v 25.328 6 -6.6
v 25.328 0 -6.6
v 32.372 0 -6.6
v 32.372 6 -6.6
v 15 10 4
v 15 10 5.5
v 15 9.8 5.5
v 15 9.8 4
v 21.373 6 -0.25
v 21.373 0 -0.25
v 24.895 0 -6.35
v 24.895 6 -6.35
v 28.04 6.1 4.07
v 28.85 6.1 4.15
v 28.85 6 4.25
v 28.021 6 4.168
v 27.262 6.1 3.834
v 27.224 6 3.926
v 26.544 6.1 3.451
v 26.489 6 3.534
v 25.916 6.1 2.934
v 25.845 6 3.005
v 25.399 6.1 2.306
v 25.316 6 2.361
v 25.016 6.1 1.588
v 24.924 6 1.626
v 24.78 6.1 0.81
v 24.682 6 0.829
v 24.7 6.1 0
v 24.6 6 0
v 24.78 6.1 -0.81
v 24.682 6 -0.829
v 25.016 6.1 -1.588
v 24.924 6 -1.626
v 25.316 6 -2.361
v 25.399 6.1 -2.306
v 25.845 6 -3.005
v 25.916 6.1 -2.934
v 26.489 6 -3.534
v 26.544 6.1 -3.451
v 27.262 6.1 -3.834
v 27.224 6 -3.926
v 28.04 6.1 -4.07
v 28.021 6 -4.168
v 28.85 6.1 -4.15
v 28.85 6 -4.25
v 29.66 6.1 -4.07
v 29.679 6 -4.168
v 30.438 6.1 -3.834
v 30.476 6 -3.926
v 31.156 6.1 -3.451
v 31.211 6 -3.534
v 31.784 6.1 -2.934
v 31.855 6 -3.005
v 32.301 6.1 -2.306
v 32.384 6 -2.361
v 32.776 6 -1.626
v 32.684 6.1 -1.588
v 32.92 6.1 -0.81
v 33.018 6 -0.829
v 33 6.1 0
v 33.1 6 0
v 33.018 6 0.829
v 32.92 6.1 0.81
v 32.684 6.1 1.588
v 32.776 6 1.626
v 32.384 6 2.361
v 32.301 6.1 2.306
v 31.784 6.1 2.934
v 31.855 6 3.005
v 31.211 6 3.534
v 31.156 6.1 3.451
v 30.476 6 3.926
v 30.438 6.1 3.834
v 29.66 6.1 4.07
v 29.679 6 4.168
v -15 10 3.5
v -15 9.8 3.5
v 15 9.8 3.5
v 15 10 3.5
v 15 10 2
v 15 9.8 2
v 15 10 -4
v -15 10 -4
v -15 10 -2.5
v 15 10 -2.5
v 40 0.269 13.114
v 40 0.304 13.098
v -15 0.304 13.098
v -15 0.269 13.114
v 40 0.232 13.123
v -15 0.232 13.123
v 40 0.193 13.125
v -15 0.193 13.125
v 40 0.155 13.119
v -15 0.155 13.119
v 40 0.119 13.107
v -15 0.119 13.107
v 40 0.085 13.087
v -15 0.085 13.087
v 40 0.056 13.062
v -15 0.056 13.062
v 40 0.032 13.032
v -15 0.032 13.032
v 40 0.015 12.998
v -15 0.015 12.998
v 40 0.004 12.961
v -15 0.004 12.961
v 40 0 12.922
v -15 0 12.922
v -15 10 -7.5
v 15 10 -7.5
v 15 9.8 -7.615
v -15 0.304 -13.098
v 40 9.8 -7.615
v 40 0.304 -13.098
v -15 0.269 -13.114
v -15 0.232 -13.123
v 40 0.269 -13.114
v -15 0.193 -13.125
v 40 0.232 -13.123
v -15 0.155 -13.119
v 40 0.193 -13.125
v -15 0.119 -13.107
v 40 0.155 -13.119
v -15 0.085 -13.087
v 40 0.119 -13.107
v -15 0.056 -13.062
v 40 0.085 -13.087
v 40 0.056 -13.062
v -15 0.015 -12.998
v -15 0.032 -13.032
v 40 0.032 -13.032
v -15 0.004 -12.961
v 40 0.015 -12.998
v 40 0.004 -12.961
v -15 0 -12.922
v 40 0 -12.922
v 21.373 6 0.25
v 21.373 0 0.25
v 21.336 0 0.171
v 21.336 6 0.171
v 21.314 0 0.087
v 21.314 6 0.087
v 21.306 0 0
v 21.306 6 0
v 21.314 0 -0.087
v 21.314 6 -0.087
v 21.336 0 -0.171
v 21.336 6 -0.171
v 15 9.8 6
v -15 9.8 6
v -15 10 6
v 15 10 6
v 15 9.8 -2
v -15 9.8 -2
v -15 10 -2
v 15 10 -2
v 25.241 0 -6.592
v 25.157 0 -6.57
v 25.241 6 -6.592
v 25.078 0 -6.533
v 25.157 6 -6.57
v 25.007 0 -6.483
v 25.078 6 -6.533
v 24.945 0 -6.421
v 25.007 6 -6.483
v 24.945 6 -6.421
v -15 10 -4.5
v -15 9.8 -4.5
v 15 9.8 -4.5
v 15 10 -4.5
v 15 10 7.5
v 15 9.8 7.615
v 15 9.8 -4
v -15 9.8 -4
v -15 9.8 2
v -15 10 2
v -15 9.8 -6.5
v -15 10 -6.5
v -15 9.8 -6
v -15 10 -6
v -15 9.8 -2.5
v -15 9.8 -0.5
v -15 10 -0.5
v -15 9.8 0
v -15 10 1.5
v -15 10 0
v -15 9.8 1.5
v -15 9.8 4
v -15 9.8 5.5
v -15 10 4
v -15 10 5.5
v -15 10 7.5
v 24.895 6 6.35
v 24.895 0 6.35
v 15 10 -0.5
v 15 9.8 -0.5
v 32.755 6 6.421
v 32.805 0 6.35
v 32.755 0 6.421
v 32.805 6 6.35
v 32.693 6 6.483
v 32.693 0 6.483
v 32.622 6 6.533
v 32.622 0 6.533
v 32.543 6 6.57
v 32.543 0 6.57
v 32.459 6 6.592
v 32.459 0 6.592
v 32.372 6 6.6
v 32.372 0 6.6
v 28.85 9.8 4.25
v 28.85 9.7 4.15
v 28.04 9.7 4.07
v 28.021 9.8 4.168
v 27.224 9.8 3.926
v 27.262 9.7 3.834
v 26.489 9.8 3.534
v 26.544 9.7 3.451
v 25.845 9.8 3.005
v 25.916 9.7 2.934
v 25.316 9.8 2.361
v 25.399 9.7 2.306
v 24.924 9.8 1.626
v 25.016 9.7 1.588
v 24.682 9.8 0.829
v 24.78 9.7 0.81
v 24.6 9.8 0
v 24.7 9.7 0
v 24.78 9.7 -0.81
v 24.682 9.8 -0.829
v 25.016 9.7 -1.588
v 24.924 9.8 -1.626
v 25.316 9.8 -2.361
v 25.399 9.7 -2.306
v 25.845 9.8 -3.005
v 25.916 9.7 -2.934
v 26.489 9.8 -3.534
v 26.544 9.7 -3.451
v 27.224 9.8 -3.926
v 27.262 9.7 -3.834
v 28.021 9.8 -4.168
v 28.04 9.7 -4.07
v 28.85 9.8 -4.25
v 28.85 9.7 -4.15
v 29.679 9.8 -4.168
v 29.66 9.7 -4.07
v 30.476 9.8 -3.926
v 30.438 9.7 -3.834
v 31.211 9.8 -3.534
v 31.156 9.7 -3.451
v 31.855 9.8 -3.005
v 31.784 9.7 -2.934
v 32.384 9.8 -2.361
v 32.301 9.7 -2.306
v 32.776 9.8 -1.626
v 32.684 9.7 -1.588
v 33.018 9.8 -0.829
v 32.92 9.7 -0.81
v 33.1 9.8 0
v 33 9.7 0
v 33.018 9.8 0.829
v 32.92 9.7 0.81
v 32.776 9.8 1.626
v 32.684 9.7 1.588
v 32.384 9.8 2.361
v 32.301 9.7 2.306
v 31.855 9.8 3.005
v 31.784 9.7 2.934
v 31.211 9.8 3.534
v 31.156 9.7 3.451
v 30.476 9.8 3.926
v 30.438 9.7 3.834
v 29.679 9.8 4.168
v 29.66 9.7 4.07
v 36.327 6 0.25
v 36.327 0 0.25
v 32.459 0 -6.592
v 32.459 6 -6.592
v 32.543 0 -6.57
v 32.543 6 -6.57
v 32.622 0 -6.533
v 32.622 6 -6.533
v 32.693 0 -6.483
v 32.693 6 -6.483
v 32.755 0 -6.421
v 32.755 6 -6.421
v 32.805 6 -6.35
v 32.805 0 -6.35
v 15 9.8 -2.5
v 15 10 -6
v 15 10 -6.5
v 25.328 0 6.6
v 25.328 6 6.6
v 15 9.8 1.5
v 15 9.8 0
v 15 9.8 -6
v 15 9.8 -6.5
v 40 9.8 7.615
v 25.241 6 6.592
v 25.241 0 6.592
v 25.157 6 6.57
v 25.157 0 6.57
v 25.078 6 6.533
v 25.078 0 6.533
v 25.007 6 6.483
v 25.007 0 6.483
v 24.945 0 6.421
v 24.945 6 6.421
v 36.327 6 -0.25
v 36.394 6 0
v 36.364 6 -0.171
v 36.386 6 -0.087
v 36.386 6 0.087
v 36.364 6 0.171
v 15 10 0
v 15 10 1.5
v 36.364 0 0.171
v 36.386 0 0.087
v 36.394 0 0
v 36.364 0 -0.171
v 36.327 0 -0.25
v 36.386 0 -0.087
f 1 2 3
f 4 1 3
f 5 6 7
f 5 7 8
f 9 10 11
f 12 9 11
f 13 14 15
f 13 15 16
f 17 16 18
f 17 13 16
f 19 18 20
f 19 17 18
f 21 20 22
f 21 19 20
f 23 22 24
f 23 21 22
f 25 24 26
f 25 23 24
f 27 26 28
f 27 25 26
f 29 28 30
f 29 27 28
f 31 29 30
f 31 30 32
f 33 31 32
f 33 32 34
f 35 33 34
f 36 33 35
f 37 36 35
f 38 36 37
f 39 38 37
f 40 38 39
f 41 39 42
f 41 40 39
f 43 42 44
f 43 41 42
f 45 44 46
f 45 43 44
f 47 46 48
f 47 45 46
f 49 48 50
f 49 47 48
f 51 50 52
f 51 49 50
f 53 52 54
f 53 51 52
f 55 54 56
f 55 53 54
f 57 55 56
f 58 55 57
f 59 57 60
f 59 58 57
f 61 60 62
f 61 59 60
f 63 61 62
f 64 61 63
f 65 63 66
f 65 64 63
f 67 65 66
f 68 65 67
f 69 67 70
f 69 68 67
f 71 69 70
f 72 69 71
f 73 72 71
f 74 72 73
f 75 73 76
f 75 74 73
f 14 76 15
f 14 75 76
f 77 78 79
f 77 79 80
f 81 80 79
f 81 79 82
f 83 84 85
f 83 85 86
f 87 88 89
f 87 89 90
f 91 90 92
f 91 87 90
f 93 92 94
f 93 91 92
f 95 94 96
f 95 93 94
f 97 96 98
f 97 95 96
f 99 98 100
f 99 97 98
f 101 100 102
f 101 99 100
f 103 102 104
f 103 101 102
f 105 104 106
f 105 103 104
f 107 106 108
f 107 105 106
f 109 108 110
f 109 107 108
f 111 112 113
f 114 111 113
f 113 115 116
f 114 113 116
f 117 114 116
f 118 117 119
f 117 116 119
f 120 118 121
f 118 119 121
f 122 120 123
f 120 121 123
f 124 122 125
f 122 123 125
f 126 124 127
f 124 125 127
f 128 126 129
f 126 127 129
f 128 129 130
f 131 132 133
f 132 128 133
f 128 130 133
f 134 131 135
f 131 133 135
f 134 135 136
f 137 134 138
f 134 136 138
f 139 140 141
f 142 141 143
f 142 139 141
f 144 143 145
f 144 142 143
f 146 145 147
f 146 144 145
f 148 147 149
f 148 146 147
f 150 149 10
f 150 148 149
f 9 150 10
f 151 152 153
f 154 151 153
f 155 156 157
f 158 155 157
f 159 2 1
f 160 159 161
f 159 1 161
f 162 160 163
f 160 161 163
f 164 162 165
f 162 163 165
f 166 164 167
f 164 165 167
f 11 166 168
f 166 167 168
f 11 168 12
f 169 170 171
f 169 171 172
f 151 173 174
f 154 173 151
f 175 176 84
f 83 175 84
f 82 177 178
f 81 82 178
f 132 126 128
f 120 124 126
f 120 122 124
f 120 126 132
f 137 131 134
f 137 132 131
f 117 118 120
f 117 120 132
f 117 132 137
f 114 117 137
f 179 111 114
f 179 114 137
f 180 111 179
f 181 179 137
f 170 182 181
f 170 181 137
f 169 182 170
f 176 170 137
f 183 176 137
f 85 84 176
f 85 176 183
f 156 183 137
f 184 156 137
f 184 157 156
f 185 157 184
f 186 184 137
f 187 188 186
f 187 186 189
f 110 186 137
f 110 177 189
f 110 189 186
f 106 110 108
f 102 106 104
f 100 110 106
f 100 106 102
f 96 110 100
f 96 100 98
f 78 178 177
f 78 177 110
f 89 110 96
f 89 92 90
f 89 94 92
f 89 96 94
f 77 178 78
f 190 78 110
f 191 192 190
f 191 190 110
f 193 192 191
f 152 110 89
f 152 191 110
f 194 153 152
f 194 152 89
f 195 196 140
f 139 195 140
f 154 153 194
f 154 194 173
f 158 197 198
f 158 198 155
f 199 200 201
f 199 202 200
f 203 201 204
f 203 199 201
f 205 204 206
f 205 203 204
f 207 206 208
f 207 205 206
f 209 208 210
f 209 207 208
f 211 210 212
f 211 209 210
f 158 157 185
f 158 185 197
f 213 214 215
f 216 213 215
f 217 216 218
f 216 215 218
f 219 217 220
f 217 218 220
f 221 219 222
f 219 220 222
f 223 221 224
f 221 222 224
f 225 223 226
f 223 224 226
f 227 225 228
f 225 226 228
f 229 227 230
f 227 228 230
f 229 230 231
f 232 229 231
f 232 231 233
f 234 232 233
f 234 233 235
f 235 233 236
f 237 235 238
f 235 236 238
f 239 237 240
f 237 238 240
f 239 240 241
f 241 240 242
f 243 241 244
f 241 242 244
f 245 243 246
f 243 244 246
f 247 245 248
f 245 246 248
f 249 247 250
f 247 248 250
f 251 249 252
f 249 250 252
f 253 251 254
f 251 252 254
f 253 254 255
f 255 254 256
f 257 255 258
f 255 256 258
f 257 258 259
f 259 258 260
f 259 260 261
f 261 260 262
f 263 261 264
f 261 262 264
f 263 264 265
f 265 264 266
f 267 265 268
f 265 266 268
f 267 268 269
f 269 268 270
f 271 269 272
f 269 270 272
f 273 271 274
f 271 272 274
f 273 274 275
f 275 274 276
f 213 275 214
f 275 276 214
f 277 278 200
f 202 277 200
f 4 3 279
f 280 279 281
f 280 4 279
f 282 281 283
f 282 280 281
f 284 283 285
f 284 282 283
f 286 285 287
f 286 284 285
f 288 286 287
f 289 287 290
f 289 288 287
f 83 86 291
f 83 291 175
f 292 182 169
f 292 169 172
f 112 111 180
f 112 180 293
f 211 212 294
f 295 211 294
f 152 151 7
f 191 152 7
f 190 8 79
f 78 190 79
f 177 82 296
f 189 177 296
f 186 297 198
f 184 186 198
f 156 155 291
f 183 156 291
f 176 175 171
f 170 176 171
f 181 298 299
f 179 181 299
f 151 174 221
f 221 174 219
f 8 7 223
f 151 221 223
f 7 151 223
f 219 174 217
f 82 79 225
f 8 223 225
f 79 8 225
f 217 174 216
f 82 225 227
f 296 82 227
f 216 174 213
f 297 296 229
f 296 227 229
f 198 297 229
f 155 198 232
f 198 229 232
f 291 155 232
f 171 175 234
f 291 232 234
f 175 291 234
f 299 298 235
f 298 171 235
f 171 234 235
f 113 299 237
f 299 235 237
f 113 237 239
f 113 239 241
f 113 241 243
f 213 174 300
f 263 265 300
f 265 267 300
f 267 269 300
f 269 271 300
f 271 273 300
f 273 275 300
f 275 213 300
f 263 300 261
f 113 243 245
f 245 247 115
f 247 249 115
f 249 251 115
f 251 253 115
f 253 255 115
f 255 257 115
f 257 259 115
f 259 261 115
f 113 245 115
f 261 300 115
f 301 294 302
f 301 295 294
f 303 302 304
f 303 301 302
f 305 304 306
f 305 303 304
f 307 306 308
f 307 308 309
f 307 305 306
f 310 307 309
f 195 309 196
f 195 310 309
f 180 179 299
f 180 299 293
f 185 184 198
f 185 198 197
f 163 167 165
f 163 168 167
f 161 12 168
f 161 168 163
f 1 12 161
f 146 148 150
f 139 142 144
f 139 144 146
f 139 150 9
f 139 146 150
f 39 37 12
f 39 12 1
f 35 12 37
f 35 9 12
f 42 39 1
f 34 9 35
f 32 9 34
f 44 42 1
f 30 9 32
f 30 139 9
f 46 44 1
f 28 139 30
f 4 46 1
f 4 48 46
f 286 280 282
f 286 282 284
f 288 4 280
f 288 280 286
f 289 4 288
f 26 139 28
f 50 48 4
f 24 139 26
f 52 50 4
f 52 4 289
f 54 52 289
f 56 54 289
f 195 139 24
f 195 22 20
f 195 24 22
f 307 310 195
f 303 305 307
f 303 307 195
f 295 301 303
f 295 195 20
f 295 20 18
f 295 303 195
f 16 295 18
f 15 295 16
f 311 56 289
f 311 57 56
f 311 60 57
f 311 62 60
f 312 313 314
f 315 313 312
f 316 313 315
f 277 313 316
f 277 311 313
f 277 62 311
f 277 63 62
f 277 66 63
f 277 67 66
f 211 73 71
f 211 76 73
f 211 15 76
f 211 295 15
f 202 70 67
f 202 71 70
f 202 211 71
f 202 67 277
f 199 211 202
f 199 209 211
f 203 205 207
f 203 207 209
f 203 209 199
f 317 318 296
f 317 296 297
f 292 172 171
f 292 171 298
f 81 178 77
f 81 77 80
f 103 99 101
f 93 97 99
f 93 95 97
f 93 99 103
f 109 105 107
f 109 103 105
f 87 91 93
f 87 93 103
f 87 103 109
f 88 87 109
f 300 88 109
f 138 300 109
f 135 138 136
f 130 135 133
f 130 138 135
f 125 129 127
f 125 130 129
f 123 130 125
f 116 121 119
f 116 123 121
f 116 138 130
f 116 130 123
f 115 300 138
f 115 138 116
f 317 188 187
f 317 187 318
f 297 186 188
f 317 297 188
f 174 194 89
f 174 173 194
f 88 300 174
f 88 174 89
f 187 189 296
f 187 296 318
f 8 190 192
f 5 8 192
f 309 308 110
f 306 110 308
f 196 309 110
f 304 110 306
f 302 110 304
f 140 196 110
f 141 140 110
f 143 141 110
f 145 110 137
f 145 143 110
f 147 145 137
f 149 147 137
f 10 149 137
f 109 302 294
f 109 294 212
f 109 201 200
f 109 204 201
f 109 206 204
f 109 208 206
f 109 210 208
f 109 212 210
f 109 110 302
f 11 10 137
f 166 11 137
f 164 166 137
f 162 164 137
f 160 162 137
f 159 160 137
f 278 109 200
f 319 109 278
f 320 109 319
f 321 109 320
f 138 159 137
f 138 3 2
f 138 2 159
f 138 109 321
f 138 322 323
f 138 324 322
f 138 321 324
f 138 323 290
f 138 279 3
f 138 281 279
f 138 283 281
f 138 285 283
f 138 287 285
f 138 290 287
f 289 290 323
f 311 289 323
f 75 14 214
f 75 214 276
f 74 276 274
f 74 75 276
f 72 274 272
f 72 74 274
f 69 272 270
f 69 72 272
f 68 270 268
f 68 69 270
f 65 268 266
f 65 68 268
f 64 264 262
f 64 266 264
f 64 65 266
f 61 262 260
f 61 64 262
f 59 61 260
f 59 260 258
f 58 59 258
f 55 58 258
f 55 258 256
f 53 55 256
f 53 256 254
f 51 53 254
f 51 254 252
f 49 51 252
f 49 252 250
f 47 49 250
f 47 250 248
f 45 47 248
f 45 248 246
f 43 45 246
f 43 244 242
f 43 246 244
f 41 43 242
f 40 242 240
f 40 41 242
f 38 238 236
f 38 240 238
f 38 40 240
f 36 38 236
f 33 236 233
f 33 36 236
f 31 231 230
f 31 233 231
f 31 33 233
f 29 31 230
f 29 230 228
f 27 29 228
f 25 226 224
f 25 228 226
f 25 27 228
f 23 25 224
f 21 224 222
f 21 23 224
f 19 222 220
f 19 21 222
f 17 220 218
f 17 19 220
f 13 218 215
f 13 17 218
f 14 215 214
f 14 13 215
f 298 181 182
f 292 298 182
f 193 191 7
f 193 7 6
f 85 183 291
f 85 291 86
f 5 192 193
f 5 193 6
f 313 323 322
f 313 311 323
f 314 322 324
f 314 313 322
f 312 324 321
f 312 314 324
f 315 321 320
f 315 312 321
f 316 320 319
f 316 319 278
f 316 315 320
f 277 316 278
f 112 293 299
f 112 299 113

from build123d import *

# Parameters (mm, degrees)
SKETCH1_R                       = 4.15
BOSS_EXTRUDE1_DEPTH             = 10
CUT_EXTRUDE2_DEPTH              = 42.907636536
CUT_EXTRUDE2_DEPTH_BACK         = 42.907636536
SKETCH2_W                       = 0.5
SKETCH2_H                       = 0.2
BOSS_EXTRUDE2_REACH             = 43.908
BOSS_EXTRUDE2_DIRECTION_2_REACH = 43.908
SKETCH10_W                      = 15.230940108
SKETCH10_H                      = 0.2
CUT_EXTRUDE6_DEPTH              = 25
CUT_EXTRUDE5_DEPTH              = 6
FILLET3_R                       = 0.5
CHAMFER1_SIZE                   = 0.1


with BuildPart() as part:
    # Sketch1 → Boss-Extrude1 (new body)
    with BuildSketch(Plane(origin=(0, 0, 0), x_dir=(1, 0, 0), z_dir=(0, 1, 0))):
        Polygon((-15, -7.5), (15, -7.5), (40, -7.5), (40, 7.5), (15, 7.5), (-15, 7.5), align=None)
        with Locations(Location((28.85, 0, 0), (0, 0, 270))):
            Circle(SKETCH1_R, mode=Mode.SUBTRACT)
    extrude(amount=BOSS_EXTRUDE1_DEPTH)

    # Sketch2 → Cut-Extrude2 (cut, two sides: drawn at the far end of the back side and taken through both)
    with BuildSketch(Plane(origin=(0, 0, 0), x_dir=(0, 0, -1), z_dir=(1, 0, 0)).offset(-CUT_EXTRUDE2_DEPTH_BACK)):
        with Locations((-5.75, 9.9)):
            Rectangle(SKETCH2_W, SKETCH2_H)
        with Locations((-3.75, 9.9)):
            Rectangle(SKETCH2_W, SKETCH2_H)
        with Locations((-1.75, 9.9)):
            Rectangle(SKETCH2_W, SKETCH2_H)
        with Locations((0.25, 9.9)):
            Rectangle(SKETCH2_W, SKETCH2_H)
        with Locations((2.25, 9.9)):
            Rectangle(SKETCH2_W, SKETCH2_H)
        with Locations((4.25, 9.9)):
            Rectangle(SKETCH2_W, SKETCH2_H)
        with Locations((6.25, 9.9)):
            Rectangle(SKETCH2_W, SKETCH2_H)
    extrude(amount=CUT_EXTRUDE2_DEPTH + CUT_EXTRUDE2_DEPTH_BACK, mode=Mode.SUBTRACT)

    # Boss-Extrude2: up to this face of the body (flat: up to its plane)
    boss_extrude2_end = Plane(part.part.faces().sort_by_distance((40, 4.977026122, 0.001172137))[0])
    # Sketch3 → Boss-Extrude2 (add, up to the picked face)
    with BuildSketch(Plane(origin=(0, 0, 0), x_dir=(0, 0, -1), z_dir=(1, 0, 0)), mode=Mode.PRIVATE) as boss_extrude2_sk1:
        with BuildLine():
            Line((7.5, 10), (13.097822121, 0.304287674))
            ThreePointArc((13.097822121, 0.304287674), (13.097822121, 0.101429225), (12.92214155, 0))
            Line((12.92214155, 0), (7.5, 0))
            Line((7.5, 0), (7.5, 10))
        make_face()
    boss_extrude2_tool1 = split(extrude(boss_extrude2_sk1.sketch, amount=BOSS_EXTRUDE2_REACH, mode=Mode.PRIVATE), bisect_by=boss_extrude2_end, keep=Keep.BOTH, mode=Mode.PRIVATE)
    # Sketch3 → Boss-Extrude2 (add, up to the picked face)
    with BuildSketch(Plane(origin=(0, 0, 0), x_dir=(0, 0, -1), z_dir=(1, 0, 0)), mode=Mode.PRIVATE) as boss_extrude2_sk2:
        with BuildLine():
            Line((-7.5, 0), (-7.5, 10))
            Line((-7.5, 10), (-13.097822121, 0.304287674))
            ThreePointArc((-13.097822121, 0.304287674), (-13.097822121, 0.101429225), (-12.92214155, 0))
            Line((-12.92214155, 0), (-7.5, 0))
        make_face()
    boss_extrude2_tool2 = split(extrude(boss_extrude2_sk2.sketch, amount=BOSS_EXTRUDE2_REACH, mode=Mode.PRIVATE), bisect_by=boss_extrude2_end, keep=Keep.BOTH, mode=Mode.PRIVATE)
    add(boss_extrude2_tool1.solids().sort_by(Axis((0, 3.336518, -9.420866), (1, 0, 0)))[0])
    add(boss_extrude2_tool2.solids().sort_by(Axis((0, 3.336518, 9.420866), (1, 0, 0)))[0])

    # Boss-Extrude2 direction 2: up to this face of the body (flat: up to its plane)
    boss_extrude2_direction_2_end = Plane(part.part.faces().sort_by_distance((-15, 4.977026122, 0.001172137))[0])
    # Sketch3 → Boss-Extrude2 direction 2 (add, up to the picked face)
    with BuildSketch(Plane(origin=(0, 0, 0), x_dir=(0, 0, -1), z_dir=(1, 0, 0)), mode=Mode.PRIVATE) as boss_extrude2_direction_2_sk1:
        with BuildLine():
            Line((7.5, 10), (13.097822121, 0.304287674))
            ThreePointArc((13.097822121, 0.304287674), (13.097822121, 0.101429225), (12.92214155, 0))
            Line((12.92214155, 0), (7.5, 0))
            Line((7.5, 0), (7.5, 10))
        make_face()
    boss_extrude2_direction_2_tool1 = split(extrude(boss_extrude2_direction_2_sk1.sketch, amount=-BOSS_EXTRUDE2_DIRECTION_2_REACH, mode=Mode.PRIVATE), bisect_by=boss_extrude2_direction_2_end, keep=Keep.BOTH, mode=Mode.PRIVATE)
    # Sketch3 → Boss-Extrude2 direction 2 (add, up to the picked face)
    with BuildSketch(Plane(origin=(0, 0, 0), x_dir=(0, 0, -1), z_dir=(1, 0, 0)), mode=Mode.PRIVATE) as boss_extrude2_direction_2_sk2:
        with BuildLine():
            Line((-7.5, 0), (-7.5, 10))
            Line((-7.5, 10), (-13.097822121, 0.304287674))
            ThreePointArc((-13.097822121, 0.304287674), (-13.097822121, 0.101429225), (-12.92214155, 0))
            Line((-12.92214155, 0), (-7.5, 0))
        make_face()
    boss_extrude2_direction_2_tool2 = split(extrude(boss_extrude2_direction_2_sk2.sketch, amount=-BOSS_EXTRUDE2_DIRECTION_2_REACH, mode=Mode.PRIVATE), bisect_by=boss_extrude2_direction_2_end, keep=Keep.BOTH, mode=Mode.PRIVATE)
    add(boss_extrude2_direction_2_tool1.solids().sort_by(Axis((0, 3.336518, -9.420866), (-1, 0, 0)))[0])
    add(boss_extrude2_direction_2_tool2.solids().sort_by(Axis((0, 3.336518, 9.420866), (-1, 0, 0)))[0])

    # Sketch10 → Cut-Extrude6 (cut)
    with BuildSketch(Plane(origin=(40, 0, 0), x_dir=(0, 0, -1), z_dir=(1, 0, 0))):
        with Locations((0, 9.9)):
            Rectangle(SKETCH10_W, SKETCH10_H)
    extrude(amount=-CUT_EXTRUDE6_DEPTH, mode=Mode.SUBTRACT)

    # Sketch8 → Cut-Extrude5 (cut)
    with BuildSketch(Plane.XZ):
        Polygon((25.039488223, -6.6), (32.660511777, -6.6), (36.471023553, 0), (32.660511777, 6.6), (25.039488223, 6.6), (21.228976447, 0), align=None)
    extrude(amount=-CUT_EXTRUDE5_DEPTH, mode=Mode.SUBTRACT)

    # Fillet3
    fillet3_edges = [part.edges().sort_by_distance(p)[0] for p in [
        (25.039488223, 3, -6.6),
        (21.228976447, 3, 0),
        (25.039488223, 3, 6.6),
        (32.660511777, 3, 6.6),
        (36.471023553, 3, 0),
        (32.660511777, 3, -6.6),
    ]]
    fillet(fillet3_edges, radius=FILLET3_R)

    # Chamfer1
    chamfer1_edges = [part.edges().sort_by_distance(p)[0] for p in [
        (28.85, 9.8, -4.15),
        (28.85, 6, -4.15),
    ]]
    chamfer(chamfer1_edges, length=CHAMFER1_SIZE)


solid = part.part
